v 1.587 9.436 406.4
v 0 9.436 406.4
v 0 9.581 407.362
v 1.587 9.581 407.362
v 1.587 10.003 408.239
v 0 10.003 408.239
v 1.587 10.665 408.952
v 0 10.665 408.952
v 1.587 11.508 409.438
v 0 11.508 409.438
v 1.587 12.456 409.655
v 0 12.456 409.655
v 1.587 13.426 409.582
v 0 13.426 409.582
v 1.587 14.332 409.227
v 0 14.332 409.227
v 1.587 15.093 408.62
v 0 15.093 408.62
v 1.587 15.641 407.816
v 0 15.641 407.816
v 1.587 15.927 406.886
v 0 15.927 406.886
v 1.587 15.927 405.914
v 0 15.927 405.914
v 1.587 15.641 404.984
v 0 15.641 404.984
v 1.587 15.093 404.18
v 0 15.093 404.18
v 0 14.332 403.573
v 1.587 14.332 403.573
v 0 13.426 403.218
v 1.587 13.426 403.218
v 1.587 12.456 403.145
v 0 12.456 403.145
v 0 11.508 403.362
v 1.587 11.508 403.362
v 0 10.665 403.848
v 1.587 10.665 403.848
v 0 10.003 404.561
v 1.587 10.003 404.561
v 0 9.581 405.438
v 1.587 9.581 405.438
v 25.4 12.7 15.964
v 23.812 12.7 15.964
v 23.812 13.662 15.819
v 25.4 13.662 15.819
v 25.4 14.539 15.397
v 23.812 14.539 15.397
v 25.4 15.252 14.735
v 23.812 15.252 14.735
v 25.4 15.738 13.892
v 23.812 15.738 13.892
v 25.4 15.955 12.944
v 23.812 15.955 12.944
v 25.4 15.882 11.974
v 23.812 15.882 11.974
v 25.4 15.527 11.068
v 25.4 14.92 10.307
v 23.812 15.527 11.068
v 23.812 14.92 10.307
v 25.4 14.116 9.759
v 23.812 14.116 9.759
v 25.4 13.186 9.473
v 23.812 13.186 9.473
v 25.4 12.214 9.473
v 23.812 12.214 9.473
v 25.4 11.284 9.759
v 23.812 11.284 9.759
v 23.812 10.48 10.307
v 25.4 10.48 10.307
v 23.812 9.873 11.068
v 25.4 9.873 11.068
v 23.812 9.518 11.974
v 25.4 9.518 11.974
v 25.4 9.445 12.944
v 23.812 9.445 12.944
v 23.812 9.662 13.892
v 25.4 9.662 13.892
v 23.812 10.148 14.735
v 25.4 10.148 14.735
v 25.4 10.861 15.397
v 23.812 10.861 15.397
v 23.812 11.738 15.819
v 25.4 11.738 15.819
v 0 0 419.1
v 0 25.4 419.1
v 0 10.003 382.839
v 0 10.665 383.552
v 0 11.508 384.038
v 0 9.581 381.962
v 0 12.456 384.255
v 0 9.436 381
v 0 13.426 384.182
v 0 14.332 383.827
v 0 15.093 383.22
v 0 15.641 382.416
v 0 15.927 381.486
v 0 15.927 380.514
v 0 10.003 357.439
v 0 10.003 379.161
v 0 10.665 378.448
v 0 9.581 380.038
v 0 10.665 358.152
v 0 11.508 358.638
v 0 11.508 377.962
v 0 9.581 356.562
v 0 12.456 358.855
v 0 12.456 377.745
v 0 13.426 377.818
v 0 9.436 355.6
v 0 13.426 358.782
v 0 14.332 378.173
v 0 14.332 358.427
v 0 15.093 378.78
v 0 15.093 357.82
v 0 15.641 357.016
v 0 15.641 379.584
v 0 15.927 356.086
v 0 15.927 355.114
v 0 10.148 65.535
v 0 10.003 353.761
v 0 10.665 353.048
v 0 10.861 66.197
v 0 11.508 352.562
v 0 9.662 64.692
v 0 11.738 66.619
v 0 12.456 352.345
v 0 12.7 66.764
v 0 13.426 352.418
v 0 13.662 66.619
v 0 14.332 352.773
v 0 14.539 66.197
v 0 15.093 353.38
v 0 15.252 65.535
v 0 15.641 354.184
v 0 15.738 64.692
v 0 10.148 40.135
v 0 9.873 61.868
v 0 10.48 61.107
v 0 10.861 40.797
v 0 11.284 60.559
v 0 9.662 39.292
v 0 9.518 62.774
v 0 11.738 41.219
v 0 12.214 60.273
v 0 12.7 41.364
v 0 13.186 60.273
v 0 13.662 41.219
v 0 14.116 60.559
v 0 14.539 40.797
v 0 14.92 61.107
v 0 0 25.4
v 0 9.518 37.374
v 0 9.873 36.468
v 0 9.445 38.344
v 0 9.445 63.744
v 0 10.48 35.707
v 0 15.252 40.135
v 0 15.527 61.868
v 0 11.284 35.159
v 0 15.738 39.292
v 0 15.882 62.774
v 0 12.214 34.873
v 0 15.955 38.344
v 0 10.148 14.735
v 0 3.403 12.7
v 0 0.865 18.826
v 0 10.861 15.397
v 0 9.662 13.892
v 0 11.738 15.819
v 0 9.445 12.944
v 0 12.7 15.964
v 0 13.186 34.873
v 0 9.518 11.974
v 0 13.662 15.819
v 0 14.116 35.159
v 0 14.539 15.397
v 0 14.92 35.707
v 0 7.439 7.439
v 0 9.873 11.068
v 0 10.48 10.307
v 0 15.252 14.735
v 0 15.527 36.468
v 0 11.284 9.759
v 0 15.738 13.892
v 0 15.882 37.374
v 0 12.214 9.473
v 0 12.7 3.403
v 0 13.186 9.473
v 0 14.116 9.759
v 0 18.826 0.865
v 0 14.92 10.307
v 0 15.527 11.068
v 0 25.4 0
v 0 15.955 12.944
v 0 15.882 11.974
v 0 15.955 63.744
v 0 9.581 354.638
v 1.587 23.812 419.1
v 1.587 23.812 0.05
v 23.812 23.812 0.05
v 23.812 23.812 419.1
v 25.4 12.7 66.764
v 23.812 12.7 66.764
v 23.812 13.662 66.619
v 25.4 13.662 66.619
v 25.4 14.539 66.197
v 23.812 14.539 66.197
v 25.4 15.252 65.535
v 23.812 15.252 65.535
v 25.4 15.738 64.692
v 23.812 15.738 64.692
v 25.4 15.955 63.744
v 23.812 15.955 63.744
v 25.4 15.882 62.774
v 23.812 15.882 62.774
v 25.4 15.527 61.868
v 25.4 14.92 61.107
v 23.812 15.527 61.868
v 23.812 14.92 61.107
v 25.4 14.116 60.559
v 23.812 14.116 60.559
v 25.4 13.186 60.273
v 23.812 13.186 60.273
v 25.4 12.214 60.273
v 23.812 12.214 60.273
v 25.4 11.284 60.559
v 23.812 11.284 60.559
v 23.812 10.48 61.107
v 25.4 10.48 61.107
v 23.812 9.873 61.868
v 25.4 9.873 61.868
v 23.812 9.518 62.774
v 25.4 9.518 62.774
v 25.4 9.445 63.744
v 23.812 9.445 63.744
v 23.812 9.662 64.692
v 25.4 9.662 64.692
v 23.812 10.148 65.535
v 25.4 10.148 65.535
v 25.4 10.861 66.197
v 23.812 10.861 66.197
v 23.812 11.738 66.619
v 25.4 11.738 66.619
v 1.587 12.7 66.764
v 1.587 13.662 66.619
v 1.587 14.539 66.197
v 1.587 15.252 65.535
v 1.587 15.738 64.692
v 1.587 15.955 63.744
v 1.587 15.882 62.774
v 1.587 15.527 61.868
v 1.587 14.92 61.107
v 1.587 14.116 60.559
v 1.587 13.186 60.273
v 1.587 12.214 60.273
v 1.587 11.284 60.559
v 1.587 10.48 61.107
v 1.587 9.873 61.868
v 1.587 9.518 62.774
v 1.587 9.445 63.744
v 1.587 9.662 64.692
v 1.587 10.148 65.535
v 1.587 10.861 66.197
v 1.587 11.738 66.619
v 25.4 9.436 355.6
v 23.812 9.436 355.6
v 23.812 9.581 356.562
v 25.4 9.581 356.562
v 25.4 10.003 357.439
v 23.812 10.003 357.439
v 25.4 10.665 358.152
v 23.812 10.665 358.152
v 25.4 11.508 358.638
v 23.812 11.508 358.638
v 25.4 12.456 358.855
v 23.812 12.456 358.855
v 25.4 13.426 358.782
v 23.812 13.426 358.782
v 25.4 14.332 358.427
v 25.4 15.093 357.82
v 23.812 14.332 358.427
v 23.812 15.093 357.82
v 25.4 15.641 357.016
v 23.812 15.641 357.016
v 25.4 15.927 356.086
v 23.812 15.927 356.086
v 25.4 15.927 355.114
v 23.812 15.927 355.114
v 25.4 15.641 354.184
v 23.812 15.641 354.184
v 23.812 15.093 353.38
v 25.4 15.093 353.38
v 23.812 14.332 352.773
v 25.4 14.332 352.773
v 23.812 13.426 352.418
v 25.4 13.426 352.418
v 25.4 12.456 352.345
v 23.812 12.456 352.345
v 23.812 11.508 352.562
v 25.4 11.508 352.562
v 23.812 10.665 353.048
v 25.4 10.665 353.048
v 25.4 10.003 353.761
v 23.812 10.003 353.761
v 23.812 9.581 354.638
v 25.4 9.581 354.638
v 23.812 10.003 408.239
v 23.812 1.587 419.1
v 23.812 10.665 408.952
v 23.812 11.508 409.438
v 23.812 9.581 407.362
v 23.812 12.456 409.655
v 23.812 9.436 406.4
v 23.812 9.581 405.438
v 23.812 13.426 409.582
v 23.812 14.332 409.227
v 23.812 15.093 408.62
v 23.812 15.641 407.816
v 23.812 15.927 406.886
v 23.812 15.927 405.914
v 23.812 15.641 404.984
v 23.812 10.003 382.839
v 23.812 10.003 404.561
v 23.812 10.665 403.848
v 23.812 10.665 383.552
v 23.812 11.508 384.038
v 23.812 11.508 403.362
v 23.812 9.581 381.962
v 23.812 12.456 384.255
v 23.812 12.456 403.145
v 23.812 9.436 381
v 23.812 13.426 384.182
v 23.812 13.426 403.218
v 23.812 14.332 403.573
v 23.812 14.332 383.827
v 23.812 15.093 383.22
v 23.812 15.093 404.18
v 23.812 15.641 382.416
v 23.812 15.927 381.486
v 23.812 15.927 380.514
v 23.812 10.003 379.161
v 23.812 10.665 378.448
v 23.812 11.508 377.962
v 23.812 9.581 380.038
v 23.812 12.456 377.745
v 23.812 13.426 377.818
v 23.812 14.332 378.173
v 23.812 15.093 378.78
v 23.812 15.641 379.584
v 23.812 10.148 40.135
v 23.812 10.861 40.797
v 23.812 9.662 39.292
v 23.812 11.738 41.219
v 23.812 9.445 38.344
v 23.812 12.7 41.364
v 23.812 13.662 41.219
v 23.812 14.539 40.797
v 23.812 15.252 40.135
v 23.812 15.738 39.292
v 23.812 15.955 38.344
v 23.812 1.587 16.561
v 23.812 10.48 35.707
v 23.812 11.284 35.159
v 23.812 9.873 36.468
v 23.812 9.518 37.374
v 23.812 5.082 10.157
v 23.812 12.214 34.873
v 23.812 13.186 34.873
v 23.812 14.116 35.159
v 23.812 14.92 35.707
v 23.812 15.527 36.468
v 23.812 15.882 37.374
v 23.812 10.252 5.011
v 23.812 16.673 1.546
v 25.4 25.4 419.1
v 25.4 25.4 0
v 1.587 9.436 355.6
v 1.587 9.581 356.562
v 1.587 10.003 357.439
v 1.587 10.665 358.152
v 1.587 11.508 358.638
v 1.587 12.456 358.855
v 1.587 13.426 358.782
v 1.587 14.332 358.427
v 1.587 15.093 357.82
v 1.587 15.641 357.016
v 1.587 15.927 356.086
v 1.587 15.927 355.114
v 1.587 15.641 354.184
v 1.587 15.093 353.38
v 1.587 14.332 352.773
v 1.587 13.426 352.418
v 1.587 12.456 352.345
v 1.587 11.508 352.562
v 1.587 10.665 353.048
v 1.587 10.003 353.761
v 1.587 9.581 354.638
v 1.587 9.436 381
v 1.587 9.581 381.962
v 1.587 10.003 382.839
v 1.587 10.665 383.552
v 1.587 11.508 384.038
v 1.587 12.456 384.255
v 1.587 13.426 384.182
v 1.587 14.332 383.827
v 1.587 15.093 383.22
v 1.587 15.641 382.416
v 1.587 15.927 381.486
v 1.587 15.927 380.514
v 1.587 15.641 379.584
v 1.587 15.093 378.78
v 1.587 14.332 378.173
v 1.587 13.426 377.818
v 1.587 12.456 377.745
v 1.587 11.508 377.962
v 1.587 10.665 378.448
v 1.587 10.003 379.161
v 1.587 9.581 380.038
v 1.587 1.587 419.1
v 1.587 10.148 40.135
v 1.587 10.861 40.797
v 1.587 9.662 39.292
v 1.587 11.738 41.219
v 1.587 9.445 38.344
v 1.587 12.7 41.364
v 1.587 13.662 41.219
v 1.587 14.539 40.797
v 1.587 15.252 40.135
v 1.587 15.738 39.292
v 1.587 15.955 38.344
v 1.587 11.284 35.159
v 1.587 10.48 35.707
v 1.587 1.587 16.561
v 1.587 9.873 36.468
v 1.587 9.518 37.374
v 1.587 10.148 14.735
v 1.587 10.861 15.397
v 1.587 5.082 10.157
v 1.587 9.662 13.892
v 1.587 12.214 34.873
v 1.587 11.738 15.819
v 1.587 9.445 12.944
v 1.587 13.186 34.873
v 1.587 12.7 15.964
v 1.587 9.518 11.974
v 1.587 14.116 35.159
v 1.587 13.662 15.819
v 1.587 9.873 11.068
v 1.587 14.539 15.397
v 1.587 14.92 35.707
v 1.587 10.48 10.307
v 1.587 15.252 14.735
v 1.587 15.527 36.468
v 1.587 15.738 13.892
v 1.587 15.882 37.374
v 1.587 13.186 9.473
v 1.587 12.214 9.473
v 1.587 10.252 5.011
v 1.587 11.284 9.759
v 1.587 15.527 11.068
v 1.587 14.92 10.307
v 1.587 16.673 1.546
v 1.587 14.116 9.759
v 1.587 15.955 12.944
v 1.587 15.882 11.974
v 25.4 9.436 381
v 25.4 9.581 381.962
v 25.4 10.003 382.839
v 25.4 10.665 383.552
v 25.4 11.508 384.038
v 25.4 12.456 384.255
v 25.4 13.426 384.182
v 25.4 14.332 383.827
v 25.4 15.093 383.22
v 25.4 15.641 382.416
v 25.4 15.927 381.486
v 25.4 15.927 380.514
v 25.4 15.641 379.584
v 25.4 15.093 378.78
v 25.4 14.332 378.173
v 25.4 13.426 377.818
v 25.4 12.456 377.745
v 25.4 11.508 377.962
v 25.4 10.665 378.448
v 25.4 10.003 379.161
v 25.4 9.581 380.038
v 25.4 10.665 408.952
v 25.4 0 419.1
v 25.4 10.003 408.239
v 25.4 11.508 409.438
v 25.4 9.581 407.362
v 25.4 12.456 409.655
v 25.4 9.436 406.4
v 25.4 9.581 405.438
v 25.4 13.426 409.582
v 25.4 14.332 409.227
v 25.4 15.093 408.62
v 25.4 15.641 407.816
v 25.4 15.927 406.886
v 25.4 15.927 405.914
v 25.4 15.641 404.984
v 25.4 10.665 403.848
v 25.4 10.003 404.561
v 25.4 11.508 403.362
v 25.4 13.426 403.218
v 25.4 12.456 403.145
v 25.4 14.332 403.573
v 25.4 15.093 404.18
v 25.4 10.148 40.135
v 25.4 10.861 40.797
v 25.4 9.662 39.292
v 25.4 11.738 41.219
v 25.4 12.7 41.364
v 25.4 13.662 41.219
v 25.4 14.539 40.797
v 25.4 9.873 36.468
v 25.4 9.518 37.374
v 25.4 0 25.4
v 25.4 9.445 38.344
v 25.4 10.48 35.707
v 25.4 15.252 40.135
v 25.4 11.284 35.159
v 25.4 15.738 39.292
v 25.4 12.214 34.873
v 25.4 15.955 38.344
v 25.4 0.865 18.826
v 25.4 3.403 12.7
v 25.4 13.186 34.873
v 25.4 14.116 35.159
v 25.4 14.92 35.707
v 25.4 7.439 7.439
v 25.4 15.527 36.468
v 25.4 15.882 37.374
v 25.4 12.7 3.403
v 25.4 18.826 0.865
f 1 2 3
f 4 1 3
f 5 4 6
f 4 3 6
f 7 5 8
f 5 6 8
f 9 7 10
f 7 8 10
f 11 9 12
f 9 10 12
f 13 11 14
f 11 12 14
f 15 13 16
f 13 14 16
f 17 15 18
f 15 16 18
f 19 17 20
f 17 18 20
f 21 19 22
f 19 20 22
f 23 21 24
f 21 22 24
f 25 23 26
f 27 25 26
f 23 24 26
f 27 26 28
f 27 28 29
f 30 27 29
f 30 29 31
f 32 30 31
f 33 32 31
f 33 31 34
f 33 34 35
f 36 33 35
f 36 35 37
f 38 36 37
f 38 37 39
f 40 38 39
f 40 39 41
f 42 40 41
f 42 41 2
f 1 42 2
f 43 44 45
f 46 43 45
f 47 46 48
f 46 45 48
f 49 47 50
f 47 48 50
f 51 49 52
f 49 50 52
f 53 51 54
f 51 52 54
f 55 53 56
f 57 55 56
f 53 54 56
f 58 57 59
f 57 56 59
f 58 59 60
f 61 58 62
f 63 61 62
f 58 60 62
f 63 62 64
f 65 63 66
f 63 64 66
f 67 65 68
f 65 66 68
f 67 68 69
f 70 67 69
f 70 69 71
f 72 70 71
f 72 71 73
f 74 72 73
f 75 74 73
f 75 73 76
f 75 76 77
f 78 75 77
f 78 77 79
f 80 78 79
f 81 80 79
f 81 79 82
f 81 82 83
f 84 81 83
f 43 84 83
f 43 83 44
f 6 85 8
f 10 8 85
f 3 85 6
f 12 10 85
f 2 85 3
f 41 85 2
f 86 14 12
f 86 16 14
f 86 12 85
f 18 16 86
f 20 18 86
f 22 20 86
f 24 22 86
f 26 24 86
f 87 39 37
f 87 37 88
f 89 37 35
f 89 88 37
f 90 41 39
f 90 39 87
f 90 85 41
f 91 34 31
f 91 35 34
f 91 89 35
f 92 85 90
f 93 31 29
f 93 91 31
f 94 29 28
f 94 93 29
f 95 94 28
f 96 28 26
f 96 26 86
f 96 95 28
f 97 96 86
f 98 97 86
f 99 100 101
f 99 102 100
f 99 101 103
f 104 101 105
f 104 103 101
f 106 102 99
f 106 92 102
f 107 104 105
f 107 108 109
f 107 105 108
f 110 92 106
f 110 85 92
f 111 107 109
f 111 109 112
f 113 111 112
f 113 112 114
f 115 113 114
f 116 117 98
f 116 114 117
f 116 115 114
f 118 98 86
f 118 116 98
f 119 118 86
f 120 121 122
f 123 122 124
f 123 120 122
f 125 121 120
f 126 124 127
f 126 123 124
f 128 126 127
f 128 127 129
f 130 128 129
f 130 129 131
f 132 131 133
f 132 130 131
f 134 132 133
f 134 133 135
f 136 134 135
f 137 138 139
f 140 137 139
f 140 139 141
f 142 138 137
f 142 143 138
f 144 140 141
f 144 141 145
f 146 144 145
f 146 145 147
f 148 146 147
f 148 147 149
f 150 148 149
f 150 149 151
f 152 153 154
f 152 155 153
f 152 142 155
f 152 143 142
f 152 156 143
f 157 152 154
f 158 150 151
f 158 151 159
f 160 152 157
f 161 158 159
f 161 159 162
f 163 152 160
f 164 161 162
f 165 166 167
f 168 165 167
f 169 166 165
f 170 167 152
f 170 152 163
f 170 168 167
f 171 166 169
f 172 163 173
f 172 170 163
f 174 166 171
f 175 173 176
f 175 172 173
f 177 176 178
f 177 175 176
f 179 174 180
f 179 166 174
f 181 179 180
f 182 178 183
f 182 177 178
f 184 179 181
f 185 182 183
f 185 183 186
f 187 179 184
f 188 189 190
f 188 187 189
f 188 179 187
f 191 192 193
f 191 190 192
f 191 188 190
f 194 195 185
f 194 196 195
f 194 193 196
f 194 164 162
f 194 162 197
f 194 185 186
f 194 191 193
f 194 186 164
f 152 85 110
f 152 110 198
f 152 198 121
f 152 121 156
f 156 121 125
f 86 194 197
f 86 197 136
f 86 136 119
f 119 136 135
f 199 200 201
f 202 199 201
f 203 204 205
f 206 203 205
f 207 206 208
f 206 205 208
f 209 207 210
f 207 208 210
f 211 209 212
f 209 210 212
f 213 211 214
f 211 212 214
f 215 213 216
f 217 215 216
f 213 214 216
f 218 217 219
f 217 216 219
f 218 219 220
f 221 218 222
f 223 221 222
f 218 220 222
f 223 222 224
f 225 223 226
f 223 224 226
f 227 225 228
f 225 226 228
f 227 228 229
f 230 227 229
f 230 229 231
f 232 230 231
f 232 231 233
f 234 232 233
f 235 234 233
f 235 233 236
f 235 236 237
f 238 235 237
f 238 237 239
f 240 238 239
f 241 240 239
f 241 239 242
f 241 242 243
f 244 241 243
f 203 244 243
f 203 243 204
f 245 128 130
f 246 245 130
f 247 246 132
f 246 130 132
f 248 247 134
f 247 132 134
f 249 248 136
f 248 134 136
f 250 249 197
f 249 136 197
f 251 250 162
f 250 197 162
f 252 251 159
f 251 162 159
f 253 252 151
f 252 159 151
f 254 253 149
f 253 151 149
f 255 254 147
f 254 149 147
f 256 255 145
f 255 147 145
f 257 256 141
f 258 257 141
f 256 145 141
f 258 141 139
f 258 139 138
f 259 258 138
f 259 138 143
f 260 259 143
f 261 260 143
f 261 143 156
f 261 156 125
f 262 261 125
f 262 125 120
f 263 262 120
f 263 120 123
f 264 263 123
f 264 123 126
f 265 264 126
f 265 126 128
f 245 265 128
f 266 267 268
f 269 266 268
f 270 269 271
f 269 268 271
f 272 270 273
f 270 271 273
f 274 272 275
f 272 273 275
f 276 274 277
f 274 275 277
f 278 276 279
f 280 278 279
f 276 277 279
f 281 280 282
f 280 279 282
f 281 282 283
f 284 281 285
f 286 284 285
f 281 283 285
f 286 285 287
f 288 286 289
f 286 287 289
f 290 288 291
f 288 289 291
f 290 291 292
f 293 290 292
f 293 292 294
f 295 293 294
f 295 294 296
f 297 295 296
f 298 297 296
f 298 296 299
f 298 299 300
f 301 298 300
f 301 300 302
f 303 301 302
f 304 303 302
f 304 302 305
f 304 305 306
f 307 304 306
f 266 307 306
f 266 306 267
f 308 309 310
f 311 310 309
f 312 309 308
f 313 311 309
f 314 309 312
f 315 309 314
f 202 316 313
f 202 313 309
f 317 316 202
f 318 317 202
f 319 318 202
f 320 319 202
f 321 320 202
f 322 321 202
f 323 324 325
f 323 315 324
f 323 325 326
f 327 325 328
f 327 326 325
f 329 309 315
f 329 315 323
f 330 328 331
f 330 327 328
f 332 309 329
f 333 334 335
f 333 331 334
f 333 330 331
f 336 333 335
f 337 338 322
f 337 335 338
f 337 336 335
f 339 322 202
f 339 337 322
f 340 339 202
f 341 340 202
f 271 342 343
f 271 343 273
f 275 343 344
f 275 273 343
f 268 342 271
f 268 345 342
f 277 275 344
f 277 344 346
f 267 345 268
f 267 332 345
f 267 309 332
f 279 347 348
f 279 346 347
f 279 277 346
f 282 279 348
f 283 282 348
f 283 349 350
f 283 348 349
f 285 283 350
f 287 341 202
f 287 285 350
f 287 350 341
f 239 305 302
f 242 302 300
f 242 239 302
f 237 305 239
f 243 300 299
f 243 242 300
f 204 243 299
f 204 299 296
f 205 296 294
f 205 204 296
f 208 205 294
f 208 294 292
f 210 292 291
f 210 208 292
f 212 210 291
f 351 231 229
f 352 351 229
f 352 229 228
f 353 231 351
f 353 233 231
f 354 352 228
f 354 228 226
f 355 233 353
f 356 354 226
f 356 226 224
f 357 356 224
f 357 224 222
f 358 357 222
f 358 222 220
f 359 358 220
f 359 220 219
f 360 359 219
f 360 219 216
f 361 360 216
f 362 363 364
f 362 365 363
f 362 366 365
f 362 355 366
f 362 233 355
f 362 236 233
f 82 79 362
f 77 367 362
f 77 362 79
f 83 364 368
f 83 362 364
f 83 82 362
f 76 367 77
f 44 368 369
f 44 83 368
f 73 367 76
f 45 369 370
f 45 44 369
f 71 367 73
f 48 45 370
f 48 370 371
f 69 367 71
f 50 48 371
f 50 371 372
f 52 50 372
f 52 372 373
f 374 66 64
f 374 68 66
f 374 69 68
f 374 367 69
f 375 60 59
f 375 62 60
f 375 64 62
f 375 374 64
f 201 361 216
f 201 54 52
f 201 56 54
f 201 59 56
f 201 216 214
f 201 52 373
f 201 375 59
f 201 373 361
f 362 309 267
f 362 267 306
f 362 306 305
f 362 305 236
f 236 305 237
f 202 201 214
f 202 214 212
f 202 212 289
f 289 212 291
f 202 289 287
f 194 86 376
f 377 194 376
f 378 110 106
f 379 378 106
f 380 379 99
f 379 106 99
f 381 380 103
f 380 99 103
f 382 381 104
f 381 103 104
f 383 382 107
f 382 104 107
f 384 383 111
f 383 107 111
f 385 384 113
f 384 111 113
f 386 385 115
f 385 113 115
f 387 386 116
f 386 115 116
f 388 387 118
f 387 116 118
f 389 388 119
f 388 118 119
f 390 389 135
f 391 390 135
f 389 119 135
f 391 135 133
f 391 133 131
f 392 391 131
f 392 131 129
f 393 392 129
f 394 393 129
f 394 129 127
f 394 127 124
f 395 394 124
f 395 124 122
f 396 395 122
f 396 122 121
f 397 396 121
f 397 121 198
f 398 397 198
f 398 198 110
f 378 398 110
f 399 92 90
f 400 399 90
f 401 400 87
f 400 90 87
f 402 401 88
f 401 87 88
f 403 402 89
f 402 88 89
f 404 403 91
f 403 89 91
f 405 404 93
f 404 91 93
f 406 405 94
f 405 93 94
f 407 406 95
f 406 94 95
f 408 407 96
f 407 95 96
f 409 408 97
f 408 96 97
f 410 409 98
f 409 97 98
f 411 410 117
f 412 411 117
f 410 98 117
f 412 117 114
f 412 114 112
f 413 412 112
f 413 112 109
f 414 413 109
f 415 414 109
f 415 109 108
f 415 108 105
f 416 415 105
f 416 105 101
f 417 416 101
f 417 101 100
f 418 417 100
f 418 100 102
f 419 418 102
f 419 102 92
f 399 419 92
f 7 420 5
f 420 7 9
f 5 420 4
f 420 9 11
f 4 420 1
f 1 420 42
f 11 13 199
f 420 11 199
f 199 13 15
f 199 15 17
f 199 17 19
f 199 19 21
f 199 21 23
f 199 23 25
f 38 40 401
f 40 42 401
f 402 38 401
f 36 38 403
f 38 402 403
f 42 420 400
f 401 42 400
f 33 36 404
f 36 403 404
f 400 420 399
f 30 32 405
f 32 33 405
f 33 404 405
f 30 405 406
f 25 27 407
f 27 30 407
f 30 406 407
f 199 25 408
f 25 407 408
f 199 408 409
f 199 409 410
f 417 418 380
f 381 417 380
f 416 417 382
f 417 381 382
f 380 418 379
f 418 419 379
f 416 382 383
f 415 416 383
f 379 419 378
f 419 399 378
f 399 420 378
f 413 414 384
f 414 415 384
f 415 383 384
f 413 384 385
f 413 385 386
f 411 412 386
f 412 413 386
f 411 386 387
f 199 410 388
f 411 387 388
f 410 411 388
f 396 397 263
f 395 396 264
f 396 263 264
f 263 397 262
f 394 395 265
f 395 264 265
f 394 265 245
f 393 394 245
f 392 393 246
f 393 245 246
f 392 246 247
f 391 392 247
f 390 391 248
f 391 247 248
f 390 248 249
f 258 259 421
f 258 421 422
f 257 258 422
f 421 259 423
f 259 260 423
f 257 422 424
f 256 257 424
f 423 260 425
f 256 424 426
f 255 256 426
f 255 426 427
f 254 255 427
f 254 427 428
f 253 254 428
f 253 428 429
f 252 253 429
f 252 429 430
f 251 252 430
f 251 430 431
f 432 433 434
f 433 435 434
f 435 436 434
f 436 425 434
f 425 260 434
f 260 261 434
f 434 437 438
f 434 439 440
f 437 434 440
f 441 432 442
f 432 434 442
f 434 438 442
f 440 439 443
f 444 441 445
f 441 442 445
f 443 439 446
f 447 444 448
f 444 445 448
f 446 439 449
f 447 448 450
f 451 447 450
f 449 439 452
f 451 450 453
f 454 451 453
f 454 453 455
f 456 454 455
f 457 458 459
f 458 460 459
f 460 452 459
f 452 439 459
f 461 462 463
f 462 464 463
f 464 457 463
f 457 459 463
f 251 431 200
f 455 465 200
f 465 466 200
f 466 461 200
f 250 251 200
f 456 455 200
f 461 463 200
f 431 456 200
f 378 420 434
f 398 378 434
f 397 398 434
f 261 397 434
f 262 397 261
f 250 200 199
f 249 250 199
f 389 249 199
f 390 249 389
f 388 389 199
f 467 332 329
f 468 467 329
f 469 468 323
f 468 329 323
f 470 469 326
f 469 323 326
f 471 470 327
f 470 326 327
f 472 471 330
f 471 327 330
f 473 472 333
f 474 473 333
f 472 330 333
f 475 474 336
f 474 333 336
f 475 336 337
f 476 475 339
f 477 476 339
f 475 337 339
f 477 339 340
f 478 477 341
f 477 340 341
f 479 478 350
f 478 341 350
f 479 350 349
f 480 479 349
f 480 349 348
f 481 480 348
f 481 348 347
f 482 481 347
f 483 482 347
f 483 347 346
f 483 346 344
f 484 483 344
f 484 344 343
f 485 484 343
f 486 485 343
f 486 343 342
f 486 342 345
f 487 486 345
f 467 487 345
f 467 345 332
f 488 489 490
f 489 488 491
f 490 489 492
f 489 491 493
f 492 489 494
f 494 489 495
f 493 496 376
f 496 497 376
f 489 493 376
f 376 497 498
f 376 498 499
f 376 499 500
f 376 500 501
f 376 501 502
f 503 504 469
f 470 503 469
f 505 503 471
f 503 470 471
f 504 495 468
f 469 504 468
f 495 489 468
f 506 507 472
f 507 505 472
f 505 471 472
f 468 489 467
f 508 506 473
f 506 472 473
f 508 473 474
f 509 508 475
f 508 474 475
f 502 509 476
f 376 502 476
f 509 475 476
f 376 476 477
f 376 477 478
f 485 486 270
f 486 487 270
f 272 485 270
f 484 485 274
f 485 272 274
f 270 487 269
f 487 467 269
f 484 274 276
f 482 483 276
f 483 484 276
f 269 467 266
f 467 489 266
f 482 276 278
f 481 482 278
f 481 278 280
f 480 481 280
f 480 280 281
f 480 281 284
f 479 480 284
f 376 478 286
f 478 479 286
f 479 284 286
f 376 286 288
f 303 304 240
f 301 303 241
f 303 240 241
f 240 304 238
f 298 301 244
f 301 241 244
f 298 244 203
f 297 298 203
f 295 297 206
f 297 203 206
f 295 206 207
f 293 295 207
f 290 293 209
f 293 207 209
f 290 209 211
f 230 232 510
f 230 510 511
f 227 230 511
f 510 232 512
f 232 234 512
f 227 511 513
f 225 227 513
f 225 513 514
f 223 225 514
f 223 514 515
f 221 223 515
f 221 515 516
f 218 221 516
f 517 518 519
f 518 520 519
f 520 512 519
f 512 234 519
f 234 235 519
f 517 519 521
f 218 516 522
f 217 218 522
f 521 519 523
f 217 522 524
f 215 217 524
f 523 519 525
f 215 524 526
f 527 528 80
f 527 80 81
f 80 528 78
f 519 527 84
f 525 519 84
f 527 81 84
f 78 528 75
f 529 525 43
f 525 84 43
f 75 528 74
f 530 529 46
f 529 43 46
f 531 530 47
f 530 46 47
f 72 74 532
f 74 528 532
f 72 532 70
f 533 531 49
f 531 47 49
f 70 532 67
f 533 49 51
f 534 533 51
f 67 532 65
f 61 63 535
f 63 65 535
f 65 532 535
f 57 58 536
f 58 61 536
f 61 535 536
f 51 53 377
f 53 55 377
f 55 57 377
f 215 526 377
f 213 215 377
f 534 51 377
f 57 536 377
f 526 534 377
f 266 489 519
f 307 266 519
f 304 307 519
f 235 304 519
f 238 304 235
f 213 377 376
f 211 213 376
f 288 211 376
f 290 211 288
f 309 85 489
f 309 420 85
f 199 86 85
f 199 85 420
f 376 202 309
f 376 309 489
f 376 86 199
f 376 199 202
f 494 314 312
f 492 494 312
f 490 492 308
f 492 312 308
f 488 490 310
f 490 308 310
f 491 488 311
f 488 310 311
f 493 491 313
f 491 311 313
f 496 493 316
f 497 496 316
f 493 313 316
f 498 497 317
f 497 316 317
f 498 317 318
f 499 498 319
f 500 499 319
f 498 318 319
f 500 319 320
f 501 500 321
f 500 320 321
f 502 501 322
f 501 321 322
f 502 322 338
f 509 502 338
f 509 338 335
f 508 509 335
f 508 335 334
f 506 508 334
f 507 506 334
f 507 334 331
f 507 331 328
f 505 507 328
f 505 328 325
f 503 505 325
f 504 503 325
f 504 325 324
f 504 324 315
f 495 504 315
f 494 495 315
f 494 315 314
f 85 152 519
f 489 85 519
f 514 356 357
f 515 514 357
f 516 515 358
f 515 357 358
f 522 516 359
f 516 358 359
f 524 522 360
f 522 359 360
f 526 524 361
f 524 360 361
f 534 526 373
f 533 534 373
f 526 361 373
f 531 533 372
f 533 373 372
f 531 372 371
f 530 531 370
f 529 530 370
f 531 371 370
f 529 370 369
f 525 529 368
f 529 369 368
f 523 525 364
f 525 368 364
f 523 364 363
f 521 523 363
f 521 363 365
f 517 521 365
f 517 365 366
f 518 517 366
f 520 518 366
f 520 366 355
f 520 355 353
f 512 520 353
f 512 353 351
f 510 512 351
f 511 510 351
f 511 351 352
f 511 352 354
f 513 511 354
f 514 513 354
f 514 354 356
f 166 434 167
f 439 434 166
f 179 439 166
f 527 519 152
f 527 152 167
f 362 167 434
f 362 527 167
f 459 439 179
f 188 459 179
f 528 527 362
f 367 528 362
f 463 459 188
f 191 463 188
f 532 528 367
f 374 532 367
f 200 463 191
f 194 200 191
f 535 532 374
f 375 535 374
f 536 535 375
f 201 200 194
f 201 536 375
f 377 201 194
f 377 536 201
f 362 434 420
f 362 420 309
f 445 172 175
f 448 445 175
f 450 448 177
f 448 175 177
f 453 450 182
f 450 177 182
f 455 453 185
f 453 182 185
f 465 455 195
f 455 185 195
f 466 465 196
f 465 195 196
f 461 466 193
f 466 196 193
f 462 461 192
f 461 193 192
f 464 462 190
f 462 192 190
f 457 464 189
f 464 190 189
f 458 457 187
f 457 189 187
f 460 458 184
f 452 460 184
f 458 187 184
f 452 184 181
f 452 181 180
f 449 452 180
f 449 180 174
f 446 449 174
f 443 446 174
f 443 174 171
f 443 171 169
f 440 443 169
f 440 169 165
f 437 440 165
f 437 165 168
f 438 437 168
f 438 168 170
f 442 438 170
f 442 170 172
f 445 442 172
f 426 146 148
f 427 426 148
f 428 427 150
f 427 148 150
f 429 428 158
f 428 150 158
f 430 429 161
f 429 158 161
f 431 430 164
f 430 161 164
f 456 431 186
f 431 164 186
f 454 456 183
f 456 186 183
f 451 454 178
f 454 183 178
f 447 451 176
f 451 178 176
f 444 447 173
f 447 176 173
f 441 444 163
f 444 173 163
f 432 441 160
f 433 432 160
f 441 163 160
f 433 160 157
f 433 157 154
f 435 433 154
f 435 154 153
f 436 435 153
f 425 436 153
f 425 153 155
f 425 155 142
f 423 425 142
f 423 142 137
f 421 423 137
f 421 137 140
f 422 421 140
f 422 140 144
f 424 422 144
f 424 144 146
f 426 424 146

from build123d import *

# Parameters (mm, degrees)
SKETCH1_W           = 25.4
SKETCH1_H           = 25.4
SKETCH1_W_2         = 22.225
SKETCH1_H_2         = 22.225
BOSS_EXTRUDE1_DEPTH = 419.1
SKETCH2_R           = 3.2639
CUT_EXTRUDE1_DEPTH  = 421.636577107
CUT_EXTRUDE2_DEPTH  = 421.636577107


with BuildPart() as part:
    # Sketch1 → Boss-Extrude1 (new body)
    with BuildSketch(Plane.XY):
        with Locations((12.7, 12.7)):
            Rectangle(SKETCH1_W, SKETCH1_H)
        with Locations((12.7, 12.7)):
            Rectangle(SKETCH1_W_2, SKETCH1_H_2, mode=Mode.SUBTRACT)
    extrude(amount=BOSS_EXTRUDE1_DEPTH)

    # Sketch2 → Cut-Extrude1 (cut, through all)
    with BuildSketch(Plane.ZY):
        with Locations((12.7, 12.7)):
            Circle(SKETCH2_R)
        with Locations((38.1, 12.7)):
            Circle(SKETCH2_R)
        with Locations((63.5, 12.7)):
            Circle(SKETCH2_R)
        with Locations(Location((355.6, 12.7, 0), (0, 0, 270))):
            Circle(SKETCH2_R)
        with Locations(Location((381, 12.7, 0), (0, 0, 270))):
            Circle(SKETCH2_R)
        with Locations(Location((406.4, 12.7, 0), (0, 0, 270))):
            Circle(SKETCH2_R)
    extrude(amount=-CUT_EXTRUDE1_DEPTH, mode=Mode.SUBTRACT)

    # Sketch3 → Cut-Extrude2 (cut, through all)
    with BuildSketch(Plane(origin=(25.4, 0, 0), x_dir=(0, 0, -1), z_dir=(1, 0, 0))):
        with BuildLine():
            Line((0, 25.4), (0, 0))
            Line((0, 0), (-25.4, 0))
            ThreePointArc((-25.4, 0), (-7.439487758, 7.439487758), (0, 25.4))
        make_face()
    extrude(amount=-CUT_EXTRUDE2_DEPTH, mode=Mode.SUBTRACT)


solid = part.part
